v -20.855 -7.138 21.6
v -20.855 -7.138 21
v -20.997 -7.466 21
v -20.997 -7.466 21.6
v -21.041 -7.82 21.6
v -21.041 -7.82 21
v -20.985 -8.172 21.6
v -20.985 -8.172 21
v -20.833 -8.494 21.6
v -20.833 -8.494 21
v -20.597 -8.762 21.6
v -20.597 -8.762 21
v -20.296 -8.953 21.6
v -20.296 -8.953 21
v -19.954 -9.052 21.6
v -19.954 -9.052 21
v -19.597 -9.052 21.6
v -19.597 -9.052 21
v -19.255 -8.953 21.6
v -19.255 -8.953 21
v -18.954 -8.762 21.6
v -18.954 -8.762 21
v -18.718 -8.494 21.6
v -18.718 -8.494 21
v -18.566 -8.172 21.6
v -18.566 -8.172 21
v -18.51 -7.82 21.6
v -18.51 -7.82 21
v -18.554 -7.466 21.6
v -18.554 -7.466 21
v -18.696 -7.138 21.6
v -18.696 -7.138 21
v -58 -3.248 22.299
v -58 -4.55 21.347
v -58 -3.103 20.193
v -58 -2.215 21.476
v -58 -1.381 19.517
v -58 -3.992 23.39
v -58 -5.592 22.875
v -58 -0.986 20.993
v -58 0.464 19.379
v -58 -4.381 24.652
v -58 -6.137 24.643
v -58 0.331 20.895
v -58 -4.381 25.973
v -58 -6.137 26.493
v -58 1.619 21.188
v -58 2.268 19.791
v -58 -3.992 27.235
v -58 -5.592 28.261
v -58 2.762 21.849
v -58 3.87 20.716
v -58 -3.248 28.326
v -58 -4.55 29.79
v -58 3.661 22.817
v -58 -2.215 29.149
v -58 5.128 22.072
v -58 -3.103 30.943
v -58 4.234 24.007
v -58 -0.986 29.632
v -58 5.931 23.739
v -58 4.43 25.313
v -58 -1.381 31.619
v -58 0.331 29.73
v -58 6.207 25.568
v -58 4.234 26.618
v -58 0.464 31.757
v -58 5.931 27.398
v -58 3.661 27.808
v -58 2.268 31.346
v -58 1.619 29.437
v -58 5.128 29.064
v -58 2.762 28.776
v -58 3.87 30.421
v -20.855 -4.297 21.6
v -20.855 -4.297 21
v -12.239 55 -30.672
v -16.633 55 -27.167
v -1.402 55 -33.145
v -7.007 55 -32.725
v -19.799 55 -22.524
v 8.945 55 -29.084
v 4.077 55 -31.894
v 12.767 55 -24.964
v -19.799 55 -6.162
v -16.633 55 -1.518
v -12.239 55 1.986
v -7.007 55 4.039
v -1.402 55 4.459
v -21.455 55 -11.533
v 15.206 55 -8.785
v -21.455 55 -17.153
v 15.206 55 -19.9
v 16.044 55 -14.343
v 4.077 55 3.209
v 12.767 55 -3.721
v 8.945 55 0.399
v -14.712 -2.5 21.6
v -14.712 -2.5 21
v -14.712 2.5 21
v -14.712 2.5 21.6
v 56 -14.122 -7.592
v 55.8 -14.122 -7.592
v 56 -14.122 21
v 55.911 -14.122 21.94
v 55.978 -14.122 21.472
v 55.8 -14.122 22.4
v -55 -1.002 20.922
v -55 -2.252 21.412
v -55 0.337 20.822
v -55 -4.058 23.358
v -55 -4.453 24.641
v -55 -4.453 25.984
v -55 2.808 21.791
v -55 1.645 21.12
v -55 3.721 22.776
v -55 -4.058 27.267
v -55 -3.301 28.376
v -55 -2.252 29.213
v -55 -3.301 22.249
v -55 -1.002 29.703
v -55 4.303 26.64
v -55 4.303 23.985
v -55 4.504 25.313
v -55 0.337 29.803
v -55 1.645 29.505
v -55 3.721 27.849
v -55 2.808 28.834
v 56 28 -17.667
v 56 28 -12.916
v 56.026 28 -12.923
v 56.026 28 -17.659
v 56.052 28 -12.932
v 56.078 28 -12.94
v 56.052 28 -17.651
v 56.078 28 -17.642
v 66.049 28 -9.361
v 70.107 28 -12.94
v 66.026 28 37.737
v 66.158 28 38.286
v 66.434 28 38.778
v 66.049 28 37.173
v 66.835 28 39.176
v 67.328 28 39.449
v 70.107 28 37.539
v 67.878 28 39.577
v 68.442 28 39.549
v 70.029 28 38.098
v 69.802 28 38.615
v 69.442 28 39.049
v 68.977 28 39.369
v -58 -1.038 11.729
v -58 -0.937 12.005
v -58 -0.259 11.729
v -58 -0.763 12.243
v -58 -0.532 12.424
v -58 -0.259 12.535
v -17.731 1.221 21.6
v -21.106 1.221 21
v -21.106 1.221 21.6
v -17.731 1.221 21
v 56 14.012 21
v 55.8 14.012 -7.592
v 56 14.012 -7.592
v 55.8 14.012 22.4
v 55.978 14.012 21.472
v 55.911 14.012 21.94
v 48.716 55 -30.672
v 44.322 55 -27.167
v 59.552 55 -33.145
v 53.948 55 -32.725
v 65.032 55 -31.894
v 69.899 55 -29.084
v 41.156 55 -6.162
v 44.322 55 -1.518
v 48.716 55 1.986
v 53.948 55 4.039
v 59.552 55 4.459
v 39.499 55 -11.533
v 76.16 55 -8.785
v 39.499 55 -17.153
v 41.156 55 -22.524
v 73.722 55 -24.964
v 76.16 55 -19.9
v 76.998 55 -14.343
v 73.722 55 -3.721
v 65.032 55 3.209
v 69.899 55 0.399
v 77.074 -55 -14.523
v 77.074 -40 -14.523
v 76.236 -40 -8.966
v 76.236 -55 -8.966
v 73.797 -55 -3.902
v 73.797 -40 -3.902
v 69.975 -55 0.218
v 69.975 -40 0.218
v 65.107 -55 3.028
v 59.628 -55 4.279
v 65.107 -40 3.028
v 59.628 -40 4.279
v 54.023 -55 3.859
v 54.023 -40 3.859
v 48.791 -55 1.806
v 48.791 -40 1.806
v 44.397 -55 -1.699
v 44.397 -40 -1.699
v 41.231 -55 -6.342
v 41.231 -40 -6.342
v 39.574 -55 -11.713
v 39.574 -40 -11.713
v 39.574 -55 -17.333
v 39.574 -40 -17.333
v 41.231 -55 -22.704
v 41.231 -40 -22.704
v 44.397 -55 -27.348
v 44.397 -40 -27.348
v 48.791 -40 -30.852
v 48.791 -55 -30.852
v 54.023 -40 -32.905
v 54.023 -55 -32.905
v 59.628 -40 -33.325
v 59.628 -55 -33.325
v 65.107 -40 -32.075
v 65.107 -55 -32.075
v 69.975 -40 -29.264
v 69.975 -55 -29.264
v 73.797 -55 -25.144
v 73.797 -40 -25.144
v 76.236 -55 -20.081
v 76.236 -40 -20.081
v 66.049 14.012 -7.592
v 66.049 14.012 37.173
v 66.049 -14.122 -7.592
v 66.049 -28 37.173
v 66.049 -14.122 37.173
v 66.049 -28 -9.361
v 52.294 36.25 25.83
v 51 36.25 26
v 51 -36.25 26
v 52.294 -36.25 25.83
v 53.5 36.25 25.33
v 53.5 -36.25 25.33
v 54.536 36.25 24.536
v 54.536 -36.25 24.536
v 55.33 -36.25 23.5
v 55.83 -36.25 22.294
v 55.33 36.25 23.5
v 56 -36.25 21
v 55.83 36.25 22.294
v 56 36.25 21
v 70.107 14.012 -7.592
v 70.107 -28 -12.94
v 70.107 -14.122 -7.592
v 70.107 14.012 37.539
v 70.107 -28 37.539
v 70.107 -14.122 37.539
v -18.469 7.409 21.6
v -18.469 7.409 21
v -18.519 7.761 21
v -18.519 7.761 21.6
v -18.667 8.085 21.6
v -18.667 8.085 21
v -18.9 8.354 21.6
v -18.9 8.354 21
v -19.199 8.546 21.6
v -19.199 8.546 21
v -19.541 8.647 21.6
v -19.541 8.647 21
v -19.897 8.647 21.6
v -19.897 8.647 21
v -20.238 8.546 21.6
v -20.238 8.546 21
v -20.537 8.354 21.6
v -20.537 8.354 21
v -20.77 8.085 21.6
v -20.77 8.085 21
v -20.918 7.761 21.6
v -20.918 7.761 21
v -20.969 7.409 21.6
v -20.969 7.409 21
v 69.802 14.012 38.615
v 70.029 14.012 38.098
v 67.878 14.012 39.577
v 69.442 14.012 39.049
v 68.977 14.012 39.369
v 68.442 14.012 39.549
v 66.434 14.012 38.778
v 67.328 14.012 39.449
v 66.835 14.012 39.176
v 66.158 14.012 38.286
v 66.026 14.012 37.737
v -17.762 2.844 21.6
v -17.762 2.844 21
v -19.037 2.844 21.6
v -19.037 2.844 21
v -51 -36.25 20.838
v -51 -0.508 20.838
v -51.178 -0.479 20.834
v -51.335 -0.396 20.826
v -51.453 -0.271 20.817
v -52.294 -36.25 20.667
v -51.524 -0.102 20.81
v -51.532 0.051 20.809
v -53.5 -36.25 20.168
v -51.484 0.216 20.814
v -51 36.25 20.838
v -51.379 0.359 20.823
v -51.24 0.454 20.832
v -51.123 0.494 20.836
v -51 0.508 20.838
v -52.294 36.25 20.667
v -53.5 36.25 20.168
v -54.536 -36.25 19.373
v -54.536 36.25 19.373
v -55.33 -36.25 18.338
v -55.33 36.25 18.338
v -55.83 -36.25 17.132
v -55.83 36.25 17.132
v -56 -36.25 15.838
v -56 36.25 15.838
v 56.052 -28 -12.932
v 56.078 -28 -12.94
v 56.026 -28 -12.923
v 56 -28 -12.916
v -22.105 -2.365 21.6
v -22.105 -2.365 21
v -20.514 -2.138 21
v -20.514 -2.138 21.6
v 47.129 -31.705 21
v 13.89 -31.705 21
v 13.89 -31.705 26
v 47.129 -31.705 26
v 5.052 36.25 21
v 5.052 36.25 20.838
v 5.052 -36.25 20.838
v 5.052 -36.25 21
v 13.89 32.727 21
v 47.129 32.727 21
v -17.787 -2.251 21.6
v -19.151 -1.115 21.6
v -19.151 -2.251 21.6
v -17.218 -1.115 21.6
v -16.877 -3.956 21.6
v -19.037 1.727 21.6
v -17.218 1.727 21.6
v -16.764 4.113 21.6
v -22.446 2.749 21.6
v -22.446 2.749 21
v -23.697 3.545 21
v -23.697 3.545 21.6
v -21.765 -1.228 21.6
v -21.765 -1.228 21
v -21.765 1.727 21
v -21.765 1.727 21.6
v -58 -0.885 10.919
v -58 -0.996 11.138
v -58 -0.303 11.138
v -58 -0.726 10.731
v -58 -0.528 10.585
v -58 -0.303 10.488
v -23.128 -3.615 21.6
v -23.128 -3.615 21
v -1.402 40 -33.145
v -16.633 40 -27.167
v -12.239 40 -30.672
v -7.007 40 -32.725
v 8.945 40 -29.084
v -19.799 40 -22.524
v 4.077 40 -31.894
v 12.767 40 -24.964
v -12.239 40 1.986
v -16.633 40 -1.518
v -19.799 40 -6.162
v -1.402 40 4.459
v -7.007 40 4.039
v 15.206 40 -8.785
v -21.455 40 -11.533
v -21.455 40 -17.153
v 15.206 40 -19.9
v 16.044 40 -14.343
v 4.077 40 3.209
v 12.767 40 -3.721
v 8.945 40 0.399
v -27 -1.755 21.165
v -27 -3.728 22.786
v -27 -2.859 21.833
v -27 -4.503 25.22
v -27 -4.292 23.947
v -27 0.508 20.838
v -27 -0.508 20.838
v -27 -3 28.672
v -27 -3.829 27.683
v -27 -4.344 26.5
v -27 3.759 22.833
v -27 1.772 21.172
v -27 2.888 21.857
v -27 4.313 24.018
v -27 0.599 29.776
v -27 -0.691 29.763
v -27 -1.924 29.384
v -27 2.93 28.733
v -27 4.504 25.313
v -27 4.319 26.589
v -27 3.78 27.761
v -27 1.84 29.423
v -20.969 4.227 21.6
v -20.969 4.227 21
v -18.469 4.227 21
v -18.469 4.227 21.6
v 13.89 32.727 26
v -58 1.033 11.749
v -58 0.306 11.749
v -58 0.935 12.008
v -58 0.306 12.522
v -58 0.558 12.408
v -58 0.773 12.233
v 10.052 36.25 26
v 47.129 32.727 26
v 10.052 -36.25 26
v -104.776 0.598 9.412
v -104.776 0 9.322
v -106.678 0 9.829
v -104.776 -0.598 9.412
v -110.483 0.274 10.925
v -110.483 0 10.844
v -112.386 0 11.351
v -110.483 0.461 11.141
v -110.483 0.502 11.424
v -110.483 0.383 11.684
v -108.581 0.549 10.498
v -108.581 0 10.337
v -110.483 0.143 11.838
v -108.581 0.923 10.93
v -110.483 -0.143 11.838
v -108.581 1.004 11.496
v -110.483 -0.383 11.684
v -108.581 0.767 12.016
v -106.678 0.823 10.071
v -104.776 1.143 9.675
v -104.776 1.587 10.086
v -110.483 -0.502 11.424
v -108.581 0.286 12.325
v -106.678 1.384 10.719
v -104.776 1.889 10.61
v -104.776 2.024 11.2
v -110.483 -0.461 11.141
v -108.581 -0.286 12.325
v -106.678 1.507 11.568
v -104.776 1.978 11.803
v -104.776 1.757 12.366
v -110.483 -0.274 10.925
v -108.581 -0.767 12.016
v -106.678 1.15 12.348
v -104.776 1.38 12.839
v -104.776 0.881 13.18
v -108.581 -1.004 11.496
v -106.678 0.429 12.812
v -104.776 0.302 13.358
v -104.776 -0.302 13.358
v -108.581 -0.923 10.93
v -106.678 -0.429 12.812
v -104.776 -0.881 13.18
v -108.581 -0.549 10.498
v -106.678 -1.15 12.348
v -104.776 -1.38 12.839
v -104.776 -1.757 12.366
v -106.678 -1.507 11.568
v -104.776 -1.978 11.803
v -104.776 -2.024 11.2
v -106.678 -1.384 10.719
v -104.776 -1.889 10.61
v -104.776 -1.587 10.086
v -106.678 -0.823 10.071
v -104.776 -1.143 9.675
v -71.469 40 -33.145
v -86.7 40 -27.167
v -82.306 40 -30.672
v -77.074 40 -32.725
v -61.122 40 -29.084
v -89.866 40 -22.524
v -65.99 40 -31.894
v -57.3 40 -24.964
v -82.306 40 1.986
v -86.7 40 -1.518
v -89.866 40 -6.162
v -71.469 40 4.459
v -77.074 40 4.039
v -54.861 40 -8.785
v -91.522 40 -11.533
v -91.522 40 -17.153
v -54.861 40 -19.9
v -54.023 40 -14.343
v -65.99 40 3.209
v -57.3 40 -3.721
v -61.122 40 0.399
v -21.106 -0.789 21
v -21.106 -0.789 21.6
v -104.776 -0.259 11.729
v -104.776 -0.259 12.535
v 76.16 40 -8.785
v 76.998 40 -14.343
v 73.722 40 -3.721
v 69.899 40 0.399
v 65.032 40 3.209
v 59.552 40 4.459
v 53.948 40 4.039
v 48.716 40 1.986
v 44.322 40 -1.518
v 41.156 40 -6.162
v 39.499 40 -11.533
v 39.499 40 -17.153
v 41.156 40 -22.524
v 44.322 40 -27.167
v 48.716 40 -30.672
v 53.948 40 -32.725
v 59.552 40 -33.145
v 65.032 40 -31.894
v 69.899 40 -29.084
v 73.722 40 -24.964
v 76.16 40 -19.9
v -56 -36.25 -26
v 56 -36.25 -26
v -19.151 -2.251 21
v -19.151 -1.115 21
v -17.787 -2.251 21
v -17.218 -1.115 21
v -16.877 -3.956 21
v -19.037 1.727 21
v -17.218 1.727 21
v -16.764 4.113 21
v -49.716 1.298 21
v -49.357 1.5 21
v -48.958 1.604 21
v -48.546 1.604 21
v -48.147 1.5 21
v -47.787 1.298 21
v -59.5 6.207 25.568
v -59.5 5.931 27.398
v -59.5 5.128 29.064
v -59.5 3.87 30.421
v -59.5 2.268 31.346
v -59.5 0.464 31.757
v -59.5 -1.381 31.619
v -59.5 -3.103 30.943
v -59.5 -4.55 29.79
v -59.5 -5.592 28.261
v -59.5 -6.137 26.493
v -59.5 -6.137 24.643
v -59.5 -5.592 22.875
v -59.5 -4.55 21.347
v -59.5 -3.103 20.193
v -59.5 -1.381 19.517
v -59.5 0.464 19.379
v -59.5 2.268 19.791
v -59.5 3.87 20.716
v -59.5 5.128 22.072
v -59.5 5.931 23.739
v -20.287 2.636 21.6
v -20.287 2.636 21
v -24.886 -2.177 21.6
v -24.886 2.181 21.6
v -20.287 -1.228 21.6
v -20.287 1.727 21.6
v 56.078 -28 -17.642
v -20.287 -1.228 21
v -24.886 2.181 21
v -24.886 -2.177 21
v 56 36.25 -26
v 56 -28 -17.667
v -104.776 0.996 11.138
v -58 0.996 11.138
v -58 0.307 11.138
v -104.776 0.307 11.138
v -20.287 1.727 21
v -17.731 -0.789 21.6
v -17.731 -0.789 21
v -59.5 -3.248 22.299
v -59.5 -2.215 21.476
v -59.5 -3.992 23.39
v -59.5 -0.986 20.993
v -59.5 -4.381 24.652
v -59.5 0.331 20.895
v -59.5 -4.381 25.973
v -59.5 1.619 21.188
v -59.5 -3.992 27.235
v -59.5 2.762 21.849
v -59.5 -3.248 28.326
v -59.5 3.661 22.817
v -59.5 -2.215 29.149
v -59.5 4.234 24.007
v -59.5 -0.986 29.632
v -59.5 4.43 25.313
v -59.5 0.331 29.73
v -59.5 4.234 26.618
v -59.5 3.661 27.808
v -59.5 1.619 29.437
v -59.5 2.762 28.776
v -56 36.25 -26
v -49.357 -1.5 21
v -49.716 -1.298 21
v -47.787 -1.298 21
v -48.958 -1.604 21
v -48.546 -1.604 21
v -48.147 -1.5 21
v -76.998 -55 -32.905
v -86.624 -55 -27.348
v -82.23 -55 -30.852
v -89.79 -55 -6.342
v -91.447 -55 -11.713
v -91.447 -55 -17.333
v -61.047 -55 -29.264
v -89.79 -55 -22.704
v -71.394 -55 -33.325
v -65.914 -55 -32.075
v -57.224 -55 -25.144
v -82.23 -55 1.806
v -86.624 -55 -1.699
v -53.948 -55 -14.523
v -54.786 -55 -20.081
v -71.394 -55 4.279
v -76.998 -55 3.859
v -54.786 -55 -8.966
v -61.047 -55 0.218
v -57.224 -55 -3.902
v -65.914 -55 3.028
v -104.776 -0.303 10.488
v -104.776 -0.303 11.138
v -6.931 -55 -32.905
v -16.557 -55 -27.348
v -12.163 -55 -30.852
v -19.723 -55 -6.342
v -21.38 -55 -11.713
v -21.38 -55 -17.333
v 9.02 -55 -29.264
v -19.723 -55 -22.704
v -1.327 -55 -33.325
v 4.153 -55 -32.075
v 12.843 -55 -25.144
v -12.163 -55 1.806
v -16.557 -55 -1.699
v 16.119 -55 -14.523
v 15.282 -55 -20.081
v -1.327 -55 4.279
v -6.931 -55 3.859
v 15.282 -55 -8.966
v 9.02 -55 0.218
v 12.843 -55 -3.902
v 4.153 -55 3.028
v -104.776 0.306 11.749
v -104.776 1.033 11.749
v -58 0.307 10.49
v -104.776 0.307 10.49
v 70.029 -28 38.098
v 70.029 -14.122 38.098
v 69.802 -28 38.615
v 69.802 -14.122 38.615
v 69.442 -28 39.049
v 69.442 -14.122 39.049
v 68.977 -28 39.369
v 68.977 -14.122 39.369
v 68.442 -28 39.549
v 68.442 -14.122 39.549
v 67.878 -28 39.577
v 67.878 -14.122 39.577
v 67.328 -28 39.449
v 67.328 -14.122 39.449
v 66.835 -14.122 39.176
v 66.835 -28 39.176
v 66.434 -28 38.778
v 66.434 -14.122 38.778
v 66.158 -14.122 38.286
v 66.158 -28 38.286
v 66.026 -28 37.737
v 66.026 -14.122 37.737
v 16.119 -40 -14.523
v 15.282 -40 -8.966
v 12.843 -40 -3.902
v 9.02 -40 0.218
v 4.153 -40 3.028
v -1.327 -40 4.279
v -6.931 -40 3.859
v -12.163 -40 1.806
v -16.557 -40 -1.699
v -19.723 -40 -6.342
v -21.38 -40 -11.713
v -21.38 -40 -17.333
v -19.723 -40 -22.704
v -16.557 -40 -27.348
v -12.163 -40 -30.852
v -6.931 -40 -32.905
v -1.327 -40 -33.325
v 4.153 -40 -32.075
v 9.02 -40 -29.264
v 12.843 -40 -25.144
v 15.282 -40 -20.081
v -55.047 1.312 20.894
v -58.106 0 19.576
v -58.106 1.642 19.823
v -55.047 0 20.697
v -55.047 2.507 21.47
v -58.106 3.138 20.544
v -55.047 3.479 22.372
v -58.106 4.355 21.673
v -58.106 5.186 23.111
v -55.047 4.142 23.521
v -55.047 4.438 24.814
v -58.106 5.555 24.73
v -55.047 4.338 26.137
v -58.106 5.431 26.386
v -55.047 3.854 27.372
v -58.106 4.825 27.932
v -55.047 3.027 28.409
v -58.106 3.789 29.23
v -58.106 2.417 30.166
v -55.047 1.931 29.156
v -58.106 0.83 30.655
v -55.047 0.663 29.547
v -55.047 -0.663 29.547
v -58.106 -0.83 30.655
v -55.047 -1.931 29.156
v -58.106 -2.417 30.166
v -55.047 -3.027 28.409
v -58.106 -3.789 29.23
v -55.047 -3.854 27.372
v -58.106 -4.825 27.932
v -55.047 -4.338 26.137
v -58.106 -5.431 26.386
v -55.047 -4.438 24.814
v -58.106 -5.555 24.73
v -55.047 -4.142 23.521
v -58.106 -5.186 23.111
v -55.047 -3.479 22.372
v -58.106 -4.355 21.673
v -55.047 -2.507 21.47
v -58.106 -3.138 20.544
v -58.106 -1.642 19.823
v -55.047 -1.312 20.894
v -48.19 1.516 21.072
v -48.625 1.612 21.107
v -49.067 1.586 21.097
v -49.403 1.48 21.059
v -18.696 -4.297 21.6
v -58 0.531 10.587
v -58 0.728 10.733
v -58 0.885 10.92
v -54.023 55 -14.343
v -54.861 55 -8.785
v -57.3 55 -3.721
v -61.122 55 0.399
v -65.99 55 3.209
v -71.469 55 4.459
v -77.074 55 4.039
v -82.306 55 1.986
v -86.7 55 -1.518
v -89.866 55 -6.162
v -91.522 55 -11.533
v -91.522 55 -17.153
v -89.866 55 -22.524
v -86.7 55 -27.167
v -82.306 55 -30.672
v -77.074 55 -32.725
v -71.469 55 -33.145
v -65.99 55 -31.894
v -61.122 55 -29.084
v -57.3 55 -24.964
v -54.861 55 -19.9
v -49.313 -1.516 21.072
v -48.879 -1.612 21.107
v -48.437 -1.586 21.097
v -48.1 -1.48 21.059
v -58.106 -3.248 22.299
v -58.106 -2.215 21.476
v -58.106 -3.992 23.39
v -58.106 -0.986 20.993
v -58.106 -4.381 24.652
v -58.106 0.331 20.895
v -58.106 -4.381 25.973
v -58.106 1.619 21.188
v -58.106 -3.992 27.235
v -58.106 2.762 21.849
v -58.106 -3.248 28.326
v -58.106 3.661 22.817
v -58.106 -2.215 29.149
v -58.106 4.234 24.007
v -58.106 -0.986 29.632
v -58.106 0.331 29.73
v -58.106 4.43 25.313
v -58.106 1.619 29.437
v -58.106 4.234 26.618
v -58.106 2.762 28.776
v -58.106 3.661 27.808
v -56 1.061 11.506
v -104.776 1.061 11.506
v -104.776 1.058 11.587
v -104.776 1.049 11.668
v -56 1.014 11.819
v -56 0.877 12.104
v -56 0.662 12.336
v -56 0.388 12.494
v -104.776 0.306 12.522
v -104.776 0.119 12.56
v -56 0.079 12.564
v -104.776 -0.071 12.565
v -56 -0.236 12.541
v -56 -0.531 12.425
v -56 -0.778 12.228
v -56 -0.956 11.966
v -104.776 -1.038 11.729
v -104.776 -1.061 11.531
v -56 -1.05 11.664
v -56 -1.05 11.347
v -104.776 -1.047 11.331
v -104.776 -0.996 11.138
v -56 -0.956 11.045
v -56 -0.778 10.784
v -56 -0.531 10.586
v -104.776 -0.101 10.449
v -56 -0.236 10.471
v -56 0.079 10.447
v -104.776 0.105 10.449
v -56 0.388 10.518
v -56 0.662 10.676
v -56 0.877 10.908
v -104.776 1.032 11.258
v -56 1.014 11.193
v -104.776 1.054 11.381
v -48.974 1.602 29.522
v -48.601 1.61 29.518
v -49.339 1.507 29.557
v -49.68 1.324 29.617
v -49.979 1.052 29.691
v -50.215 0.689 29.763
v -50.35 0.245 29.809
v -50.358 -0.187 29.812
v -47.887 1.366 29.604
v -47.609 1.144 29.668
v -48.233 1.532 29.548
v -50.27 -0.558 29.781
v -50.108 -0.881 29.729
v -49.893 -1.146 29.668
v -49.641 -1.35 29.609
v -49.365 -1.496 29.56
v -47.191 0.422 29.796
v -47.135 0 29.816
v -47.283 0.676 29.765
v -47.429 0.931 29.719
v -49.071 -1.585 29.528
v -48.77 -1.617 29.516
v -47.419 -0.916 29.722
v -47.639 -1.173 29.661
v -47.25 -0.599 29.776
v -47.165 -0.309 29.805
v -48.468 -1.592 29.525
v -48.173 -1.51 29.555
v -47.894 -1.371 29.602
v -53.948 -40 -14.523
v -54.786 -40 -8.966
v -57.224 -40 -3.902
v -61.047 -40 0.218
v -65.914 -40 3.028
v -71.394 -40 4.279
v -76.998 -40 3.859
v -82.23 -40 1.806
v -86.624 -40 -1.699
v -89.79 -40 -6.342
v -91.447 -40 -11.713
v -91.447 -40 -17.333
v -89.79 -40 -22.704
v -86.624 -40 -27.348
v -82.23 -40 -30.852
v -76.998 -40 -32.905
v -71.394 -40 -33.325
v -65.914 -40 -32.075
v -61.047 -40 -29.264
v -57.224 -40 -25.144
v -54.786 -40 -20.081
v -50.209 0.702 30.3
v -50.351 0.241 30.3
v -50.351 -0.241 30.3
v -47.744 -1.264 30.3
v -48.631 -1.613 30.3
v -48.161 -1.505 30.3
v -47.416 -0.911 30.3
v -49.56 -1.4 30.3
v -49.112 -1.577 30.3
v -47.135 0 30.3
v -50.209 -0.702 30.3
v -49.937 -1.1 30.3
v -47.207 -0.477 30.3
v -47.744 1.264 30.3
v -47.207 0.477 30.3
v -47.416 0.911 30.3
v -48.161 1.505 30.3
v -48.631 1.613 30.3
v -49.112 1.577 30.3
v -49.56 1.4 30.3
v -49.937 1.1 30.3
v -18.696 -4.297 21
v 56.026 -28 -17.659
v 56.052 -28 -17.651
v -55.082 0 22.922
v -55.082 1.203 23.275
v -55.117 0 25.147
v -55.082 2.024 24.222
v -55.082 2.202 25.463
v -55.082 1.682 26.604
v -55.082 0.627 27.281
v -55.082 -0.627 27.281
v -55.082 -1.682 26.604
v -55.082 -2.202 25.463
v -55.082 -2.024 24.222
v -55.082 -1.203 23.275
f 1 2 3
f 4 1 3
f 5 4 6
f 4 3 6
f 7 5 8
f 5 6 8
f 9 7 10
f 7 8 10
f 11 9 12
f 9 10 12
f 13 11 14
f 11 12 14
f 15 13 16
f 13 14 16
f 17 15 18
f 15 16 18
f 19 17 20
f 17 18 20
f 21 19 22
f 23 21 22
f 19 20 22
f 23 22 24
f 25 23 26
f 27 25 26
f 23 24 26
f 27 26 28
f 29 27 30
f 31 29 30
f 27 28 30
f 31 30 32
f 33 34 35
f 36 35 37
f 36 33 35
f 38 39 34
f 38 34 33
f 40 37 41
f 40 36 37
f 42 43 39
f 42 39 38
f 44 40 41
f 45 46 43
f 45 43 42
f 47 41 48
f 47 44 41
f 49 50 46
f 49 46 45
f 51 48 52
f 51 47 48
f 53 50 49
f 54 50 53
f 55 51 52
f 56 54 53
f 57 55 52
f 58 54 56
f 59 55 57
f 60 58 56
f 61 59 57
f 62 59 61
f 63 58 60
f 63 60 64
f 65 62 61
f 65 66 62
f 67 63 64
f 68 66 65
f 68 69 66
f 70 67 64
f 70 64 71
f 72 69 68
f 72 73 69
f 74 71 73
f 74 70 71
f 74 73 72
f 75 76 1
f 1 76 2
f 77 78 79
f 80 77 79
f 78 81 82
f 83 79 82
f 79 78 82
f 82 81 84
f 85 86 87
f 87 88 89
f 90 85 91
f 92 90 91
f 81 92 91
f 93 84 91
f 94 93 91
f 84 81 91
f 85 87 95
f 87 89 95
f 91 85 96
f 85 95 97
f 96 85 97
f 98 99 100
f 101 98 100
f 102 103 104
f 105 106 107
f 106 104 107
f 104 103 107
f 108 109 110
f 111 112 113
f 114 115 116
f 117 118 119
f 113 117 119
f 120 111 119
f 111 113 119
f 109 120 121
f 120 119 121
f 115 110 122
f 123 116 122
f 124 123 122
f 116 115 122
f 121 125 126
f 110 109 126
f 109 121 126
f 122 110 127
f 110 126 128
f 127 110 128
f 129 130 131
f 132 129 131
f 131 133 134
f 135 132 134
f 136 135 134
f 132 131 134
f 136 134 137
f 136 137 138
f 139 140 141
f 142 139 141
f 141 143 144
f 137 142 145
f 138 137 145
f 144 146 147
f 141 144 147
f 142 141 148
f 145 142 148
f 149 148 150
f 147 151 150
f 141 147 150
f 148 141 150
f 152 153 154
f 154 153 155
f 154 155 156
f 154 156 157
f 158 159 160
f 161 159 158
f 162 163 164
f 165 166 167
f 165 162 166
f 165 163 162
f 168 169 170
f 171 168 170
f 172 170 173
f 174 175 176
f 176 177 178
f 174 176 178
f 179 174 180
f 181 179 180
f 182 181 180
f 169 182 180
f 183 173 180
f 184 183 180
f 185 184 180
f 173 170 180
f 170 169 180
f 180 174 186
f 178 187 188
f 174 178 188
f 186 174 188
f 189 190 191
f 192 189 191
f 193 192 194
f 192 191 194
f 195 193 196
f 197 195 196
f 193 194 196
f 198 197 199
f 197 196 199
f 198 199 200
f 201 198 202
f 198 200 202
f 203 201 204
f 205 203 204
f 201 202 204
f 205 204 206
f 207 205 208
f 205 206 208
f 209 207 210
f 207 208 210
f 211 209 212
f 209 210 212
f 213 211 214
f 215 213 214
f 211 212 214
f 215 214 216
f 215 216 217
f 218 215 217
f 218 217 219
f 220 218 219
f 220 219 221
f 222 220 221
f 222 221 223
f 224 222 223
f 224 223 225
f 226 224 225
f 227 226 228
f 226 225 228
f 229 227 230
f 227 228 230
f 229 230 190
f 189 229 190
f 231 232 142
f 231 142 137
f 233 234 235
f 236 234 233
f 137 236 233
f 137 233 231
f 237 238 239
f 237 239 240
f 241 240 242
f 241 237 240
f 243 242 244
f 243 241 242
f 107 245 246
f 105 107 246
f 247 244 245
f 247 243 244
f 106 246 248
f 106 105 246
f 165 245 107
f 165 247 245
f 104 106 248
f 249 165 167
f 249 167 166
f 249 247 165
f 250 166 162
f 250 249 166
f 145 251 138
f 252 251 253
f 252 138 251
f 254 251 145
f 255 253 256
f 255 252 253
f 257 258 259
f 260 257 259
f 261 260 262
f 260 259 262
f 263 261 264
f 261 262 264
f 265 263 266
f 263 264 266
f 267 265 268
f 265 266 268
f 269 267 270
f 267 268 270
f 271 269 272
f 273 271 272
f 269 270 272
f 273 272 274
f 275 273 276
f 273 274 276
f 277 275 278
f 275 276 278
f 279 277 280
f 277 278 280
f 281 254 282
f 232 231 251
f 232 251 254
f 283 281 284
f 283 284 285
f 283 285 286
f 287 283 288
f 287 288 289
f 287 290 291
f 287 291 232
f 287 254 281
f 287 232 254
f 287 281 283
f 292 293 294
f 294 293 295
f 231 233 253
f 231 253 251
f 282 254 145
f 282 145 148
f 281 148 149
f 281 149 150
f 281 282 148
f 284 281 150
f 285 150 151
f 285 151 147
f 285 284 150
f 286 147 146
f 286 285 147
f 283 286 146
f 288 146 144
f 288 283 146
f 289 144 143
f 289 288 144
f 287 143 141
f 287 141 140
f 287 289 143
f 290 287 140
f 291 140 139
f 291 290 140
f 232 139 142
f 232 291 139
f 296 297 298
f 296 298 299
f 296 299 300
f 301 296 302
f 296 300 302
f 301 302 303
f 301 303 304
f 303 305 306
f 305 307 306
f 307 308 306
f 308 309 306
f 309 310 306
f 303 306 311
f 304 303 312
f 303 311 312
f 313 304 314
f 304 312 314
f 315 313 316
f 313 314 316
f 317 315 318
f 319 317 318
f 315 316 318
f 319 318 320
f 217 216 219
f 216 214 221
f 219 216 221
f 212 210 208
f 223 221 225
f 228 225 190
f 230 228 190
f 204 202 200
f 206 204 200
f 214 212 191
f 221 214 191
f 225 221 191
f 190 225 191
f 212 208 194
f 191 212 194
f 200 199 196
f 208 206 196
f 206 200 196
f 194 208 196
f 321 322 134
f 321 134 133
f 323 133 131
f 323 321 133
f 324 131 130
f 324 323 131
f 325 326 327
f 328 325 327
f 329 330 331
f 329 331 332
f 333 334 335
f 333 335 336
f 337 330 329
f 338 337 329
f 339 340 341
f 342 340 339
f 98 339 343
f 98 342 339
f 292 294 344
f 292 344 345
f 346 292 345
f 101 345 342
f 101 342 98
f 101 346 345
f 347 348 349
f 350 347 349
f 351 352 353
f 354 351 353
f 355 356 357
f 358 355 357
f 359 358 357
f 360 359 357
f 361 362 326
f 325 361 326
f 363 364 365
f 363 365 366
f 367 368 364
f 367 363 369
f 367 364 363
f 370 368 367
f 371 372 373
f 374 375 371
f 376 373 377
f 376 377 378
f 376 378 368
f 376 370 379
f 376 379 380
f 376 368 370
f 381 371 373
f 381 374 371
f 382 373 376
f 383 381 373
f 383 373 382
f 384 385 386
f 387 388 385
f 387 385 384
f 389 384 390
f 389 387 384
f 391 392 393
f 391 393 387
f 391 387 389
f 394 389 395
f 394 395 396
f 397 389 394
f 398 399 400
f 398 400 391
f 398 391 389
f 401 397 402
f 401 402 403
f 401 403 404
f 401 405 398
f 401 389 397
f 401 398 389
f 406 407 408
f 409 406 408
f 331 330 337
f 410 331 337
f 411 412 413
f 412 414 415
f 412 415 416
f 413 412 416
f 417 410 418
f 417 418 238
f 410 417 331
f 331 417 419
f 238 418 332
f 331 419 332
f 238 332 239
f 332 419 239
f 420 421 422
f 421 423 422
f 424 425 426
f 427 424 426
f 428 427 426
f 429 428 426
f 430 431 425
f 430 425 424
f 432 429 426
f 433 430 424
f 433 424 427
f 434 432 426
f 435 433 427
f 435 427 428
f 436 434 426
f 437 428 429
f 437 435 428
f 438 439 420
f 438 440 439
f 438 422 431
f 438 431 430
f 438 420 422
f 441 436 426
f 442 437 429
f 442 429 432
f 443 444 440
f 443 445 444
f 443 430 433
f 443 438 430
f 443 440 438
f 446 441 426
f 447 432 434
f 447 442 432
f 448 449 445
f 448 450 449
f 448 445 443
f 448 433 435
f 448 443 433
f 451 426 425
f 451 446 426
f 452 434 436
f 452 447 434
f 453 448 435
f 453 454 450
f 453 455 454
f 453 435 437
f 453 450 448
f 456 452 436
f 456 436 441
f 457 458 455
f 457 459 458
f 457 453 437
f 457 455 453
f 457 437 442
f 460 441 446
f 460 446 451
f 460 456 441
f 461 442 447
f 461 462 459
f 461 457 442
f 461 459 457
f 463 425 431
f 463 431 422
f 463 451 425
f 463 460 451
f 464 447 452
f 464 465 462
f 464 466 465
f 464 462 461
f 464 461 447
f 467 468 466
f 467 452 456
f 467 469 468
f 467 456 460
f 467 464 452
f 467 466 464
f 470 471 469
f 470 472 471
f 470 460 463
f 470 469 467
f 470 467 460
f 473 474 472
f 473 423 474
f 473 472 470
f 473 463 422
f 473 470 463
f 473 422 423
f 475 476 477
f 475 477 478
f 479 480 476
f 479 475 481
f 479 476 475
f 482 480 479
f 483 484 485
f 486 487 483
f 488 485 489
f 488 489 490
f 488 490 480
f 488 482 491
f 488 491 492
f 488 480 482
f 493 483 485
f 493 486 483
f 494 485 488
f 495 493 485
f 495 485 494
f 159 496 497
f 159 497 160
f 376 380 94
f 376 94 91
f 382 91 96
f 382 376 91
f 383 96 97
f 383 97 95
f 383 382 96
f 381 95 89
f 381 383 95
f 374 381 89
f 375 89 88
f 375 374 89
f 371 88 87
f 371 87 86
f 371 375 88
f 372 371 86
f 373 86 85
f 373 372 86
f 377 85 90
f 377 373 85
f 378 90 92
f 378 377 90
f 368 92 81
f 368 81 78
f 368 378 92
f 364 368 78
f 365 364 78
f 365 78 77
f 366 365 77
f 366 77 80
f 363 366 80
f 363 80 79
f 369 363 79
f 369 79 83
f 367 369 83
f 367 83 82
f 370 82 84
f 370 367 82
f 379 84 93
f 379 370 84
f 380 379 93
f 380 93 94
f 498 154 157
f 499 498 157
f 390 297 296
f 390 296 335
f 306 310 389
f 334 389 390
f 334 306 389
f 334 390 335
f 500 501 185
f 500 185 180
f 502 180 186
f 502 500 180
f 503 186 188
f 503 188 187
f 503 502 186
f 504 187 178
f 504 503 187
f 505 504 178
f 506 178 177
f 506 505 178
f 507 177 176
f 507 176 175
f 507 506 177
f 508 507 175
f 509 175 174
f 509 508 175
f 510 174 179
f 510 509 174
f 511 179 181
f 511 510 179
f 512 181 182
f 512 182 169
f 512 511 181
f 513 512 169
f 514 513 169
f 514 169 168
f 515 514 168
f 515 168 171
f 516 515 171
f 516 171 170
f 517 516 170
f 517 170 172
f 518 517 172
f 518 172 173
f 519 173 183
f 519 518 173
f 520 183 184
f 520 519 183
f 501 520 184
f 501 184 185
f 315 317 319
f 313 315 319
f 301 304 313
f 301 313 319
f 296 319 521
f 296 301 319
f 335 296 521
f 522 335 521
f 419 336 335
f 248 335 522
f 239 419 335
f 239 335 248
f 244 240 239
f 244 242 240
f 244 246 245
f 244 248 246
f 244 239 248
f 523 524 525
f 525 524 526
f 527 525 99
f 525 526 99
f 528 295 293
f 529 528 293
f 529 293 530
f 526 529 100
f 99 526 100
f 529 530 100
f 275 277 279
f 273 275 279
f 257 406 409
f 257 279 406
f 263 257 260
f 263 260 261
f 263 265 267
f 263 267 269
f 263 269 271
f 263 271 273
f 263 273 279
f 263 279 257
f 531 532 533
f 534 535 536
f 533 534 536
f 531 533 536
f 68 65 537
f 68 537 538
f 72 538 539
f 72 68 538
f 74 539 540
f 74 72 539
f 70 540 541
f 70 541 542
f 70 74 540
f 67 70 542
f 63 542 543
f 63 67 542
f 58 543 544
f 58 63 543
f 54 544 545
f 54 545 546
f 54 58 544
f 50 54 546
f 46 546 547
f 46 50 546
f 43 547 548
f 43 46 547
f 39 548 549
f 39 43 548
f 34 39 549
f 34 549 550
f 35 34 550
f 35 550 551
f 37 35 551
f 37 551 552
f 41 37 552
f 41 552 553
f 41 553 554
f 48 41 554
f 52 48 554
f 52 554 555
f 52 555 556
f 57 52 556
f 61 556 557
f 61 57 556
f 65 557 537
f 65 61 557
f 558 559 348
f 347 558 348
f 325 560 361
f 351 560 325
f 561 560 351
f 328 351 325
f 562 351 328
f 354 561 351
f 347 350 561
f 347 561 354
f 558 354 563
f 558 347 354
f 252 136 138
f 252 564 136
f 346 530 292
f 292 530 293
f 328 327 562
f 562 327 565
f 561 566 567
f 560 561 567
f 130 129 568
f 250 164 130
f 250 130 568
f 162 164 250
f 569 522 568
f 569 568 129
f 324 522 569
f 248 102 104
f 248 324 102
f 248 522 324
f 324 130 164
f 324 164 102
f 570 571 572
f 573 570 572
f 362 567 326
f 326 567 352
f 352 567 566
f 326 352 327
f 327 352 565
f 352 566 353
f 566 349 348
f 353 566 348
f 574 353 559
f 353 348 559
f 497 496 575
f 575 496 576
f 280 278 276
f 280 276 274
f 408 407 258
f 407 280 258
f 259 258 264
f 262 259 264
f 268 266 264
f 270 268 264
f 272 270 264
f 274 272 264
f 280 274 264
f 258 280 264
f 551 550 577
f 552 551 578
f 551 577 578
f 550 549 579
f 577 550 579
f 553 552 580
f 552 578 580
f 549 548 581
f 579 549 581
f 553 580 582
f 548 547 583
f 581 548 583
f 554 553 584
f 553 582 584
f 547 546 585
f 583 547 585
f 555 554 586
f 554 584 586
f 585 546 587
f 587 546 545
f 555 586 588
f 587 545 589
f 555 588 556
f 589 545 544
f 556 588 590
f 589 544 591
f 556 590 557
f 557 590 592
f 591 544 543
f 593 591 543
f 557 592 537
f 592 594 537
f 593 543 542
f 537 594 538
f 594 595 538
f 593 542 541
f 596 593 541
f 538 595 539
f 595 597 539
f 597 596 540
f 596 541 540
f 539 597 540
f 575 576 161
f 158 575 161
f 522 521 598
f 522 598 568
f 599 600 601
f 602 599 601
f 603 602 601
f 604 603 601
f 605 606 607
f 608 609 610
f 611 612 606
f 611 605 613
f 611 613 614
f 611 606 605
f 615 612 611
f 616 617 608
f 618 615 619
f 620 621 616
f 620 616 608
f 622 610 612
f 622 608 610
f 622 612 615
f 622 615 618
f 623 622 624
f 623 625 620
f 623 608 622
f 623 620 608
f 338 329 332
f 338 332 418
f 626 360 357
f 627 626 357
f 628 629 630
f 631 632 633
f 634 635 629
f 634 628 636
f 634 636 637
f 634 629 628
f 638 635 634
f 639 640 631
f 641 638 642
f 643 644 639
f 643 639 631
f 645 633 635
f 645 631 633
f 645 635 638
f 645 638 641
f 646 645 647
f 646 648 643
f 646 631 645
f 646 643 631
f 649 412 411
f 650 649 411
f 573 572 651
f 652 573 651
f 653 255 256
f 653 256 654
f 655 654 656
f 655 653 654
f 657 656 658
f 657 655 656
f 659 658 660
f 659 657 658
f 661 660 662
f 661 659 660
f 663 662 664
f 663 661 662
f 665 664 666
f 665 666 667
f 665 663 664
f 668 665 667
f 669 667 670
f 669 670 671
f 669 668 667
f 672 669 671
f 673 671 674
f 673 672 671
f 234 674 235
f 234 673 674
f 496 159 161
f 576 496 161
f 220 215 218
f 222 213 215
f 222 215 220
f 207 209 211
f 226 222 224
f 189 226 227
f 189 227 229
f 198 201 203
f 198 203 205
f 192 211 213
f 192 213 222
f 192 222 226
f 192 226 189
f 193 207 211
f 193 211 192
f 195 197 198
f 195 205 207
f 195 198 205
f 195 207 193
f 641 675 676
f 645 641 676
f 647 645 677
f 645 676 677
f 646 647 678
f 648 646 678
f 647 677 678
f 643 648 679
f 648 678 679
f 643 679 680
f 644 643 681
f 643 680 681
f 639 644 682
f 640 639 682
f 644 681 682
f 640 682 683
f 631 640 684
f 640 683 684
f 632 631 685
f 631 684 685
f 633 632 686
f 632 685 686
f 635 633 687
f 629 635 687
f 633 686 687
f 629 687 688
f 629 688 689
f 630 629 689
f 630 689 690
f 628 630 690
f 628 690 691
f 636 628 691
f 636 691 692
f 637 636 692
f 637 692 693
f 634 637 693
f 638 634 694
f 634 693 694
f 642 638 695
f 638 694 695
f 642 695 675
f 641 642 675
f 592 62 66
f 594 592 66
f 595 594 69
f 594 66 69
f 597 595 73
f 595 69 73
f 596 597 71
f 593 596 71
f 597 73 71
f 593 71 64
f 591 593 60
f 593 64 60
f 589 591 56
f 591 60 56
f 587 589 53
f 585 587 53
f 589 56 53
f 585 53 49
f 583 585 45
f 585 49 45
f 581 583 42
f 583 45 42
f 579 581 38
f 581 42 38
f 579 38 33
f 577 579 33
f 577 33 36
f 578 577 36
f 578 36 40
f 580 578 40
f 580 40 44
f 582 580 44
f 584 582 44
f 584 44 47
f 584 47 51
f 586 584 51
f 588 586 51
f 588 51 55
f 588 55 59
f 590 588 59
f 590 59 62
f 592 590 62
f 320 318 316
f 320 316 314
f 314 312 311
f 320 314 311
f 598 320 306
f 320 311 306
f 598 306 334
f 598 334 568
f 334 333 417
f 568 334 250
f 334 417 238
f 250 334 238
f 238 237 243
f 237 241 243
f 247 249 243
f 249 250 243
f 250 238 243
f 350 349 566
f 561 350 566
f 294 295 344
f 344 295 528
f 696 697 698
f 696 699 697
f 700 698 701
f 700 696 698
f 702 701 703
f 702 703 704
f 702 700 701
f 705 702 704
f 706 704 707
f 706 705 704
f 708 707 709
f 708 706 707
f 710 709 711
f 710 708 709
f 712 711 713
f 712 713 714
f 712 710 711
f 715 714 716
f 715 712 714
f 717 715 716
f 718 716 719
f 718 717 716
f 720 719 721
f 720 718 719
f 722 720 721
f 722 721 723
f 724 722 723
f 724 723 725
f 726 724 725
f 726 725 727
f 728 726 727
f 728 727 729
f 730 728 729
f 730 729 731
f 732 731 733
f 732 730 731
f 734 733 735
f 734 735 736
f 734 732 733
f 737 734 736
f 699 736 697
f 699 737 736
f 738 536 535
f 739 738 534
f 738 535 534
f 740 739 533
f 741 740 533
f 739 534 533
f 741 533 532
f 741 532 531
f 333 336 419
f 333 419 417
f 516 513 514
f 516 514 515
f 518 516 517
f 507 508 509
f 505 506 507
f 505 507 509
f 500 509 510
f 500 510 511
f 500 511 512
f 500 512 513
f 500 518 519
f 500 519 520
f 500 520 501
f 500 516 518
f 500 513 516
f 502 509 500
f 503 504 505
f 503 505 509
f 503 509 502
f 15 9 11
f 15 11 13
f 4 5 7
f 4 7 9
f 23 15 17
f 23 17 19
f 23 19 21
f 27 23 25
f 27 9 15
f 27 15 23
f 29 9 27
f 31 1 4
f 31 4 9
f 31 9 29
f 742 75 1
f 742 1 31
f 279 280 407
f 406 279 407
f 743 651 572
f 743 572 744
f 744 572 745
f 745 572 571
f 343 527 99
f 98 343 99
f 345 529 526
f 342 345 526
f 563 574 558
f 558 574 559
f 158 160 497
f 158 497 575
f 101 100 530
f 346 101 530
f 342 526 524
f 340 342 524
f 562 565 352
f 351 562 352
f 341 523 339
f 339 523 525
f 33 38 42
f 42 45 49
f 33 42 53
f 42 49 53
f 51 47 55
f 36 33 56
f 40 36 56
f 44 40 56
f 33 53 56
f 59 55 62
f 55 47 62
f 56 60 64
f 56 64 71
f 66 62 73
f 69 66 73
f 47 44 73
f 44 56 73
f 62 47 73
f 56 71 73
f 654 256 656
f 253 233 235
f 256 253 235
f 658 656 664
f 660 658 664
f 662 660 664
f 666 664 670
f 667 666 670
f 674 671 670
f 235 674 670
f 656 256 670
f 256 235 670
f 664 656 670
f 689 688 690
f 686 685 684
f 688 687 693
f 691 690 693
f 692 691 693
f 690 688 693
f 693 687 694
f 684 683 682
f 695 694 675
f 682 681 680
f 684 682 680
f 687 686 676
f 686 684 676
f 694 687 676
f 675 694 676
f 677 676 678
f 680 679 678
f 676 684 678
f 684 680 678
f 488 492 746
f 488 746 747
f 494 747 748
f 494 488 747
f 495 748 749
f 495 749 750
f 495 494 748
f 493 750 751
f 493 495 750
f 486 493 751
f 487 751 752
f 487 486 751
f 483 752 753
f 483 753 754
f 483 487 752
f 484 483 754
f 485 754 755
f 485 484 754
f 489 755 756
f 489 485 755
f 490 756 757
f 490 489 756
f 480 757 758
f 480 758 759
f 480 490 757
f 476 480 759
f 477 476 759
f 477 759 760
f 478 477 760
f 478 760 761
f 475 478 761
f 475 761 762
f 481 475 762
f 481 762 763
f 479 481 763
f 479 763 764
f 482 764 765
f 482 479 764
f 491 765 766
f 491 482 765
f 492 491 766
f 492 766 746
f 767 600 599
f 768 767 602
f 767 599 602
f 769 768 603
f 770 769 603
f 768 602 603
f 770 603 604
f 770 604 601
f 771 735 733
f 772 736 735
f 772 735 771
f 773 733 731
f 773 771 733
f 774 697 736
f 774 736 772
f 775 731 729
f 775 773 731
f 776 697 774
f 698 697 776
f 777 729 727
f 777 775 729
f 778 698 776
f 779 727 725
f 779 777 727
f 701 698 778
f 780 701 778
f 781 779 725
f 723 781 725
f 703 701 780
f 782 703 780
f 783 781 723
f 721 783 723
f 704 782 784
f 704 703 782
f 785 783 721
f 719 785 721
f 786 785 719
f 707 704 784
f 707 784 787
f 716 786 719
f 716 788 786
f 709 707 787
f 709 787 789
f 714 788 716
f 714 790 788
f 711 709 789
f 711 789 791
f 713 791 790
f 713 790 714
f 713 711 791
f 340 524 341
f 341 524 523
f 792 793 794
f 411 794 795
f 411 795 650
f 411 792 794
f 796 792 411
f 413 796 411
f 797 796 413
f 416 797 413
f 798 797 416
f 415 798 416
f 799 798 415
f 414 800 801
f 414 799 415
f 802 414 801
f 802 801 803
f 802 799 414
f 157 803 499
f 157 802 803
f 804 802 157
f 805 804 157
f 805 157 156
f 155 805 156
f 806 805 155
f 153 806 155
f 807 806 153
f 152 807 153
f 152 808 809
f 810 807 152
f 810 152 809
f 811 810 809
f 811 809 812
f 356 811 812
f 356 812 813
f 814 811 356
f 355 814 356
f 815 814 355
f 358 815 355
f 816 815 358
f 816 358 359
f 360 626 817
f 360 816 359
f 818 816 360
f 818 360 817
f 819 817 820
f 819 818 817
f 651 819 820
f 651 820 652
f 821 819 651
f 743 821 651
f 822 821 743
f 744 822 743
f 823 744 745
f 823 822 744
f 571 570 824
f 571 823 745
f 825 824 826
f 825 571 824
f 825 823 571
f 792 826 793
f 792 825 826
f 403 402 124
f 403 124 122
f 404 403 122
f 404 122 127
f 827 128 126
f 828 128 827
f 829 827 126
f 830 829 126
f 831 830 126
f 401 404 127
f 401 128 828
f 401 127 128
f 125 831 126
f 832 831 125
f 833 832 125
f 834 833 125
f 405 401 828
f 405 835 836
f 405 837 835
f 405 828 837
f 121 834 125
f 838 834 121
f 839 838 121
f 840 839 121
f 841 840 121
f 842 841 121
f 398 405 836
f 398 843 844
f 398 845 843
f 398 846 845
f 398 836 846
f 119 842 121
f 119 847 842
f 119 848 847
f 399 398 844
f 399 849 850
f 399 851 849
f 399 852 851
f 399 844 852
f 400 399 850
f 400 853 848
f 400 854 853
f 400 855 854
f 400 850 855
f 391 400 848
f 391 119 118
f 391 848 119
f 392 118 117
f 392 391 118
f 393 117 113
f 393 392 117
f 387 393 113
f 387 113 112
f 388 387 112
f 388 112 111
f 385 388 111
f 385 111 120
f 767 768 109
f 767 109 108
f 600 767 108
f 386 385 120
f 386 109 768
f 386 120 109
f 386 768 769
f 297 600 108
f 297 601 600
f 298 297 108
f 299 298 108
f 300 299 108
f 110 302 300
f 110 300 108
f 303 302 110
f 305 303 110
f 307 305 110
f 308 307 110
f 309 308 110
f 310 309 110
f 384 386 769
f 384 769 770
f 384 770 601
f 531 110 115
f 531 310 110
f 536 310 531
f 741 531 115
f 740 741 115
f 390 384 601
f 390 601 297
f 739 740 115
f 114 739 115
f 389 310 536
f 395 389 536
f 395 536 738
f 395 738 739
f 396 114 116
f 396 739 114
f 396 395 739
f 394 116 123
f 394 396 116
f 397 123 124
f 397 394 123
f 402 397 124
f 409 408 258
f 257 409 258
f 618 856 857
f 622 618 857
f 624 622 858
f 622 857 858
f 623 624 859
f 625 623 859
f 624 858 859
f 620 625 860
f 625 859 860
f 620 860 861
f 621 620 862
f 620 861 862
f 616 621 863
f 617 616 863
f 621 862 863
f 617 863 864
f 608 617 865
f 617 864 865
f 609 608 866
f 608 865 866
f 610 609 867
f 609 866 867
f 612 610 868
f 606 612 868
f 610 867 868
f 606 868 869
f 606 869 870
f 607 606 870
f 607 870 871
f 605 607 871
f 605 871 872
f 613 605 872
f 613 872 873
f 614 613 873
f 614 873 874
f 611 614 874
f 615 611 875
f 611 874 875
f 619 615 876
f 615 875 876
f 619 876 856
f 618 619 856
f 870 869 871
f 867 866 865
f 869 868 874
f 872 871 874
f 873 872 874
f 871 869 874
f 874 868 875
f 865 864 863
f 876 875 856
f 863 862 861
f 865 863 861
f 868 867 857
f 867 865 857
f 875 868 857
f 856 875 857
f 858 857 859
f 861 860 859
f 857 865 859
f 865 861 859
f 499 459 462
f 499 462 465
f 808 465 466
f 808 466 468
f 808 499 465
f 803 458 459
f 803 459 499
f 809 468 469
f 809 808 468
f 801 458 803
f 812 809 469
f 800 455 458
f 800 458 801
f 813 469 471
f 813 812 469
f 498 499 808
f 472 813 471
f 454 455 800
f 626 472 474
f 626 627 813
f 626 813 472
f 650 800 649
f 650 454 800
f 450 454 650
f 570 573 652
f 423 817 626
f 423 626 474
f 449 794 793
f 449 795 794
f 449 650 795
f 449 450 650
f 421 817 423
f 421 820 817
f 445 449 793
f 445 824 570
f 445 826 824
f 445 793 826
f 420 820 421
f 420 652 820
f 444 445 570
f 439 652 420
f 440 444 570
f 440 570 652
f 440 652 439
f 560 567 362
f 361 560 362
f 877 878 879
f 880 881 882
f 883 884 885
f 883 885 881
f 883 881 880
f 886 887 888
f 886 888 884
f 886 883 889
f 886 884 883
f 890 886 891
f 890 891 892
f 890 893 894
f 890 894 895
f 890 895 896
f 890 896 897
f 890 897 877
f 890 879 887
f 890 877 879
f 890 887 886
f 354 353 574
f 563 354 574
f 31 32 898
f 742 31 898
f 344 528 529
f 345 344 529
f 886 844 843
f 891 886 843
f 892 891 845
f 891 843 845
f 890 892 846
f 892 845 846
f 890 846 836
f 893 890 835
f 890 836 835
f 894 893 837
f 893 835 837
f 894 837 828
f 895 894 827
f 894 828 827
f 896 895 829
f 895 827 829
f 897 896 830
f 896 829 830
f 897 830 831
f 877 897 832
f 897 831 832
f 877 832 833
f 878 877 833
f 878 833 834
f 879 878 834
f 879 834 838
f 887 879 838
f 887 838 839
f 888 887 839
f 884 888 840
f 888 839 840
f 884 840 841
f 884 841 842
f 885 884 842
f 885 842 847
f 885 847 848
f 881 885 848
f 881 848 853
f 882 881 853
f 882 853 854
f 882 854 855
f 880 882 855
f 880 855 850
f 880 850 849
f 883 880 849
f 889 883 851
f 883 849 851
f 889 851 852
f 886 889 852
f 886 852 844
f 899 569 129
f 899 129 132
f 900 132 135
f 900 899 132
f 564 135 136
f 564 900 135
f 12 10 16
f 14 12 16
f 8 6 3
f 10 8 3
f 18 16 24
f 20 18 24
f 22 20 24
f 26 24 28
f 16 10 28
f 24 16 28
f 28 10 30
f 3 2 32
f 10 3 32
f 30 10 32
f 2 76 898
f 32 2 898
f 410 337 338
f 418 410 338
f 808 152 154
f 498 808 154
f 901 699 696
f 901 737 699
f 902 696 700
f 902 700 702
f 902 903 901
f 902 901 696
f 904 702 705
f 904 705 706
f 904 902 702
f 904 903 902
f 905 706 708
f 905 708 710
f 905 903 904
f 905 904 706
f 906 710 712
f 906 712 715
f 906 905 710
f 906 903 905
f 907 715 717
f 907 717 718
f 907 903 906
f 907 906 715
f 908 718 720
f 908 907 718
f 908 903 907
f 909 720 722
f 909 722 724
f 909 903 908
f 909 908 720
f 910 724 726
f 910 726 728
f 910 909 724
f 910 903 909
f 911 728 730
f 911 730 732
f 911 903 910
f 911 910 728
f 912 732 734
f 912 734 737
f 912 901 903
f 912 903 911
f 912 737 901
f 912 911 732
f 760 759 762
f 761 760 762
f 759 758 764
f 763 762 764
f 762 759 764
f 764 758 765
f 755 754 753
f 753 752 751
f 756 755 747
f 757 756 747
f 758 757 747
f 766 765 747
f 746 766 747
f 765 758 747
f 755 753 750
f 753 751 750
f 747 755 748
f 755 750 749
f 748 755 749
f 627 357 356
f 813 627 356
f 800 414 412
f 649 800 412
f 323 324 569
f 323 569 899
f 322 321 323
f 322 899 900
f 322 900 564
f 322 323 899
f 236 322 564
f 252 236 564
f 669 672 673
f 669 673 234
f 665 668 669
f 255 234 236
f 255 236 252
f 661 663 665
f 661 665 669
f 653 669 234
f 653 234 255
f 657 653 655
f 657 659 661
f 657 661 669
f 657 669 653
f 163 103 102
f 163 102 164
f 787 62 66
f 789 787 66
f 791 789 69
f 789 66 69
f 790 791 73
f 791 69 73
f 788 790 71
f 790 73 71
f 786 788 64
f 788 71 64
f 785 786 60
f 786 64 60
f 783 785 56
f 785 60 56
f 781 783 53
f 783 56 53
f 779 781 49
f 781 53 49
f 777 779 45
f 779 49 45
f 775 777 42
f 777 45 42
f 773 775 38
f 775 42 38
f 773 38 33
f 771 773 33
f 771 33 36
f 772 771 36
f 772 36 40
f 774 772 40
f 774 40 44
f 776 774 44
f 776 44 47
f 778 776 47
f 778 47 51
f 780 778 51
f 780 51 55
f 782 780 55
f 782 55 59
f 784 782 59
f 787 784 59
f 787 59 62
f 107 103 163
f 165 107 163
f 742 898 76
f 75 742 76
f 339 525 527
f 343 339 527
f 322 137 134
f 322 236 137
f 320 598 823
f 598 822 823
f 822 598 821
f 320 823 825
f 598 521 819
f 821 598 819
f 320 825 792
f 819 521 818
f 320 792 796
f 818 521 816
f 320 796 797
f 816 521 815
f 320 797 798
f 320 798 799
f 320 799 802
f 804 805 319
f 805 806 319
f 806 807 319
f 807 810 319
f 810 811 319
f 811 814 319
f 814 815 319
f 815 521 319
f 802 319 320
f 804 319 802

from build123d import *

# Parameters (mm, degrees)
F0_W           = 112
F0_H           = 52
F1_DEPTH       = 36.25
F1_DEPTH_BACK  = 36.25
F2_W           = 62.7835113555
F2_H           = 8.2989688963
F3_DEPTH       = 40
F3_DEPTH_BACK  = 40
F4_SIZE        = 5
F5_R           = 5
F8_DEPTH       = 0.6
F9_W           = 3.3755060285
F9_H           = 2.0101326518
F10_DEPTH      = 0.6
F12_R          = 18.8548205179
F13_DEPTH      = 15
F19_R          = 18.8548205179
F20_DEPTH      = 15
F24_DEPTH      = 28
F24_DEPTH_BACK = 28
F26_W          = 28.1342324962
F26_H          = 48.9349166028
F27_DEPTH      = 25
F29_R          = 4.5035590708
F30_DEPTH      = 28
F32_R          = 6.2065419795
F33_DEPTH      = 1.5
F36_R          = 4.4303853292
F37_DEPTH      = 25
F38_R          = 1.617072427
F39_DEPTH      = 9.3
F40_W          = 33.2386381924
F40_H          = 64.4318200648
F41_DEPTH      = 25
F42_R          = 1.0614733058
F43_DEPTH      = 80
F45_DEPTH      = 90


# Not quite as in the source:
# - the program builds the solid bodies; features that only make, move or delete a surface that nothing else refers to are left out


with BuildPart() as f1:
    # F0 (on Front) → F1 (new body, two sides)
    with BuildSketch(Plane.XZ) as f1_sk:
        Rectangle(F0_W, F0_H)
    extrude(amount=F1_DEPTH)
    extrude(f1_sk.sketch, amount=-F1_DEPTH_BACK)

    # F2 (on Front) → F3 (cut, two sides)
    with BuildSketch(Plane.XZ) as f3_sk:
        with Locations((-26.3402080163, 24.9871136621)):
            Rectangle(F2_W, F2_H)
    extrude(amount=-F3_DEPTH, mode=Mode.SUBTRACT)
    extrude(f3_sk.sketch, amount=F3_DEPTH_BACK, mode=Mode.SUBTRACT)

    # F4
    f4_edges = [f1.edges().sort_by_distance(p)[0] for p in [
        (5.051548, 0, 26),
    ]]
    chamfer(f4_edges, length=F4_SIZE)

    # F5
    f5_edges = [f1.edges().sort_by_distance(p)[0] for p in [
        (56, 0, 26),
        (-56, 0, 20.837629),
    ]]
    fillet(f5_edges, radius=F5_R)

    # F23 (on Front) → F24 (join, two sides)
    with BuildSketch(Plane.XZ) as f24_sk:
        with BuildLine():
            Line((66.0493522882, -9.3606118894), (56.0777671635, -12.9401576556))
            ThreePointArc((56.0777671635, -12.9401576556), (52.810402565, -15.2911024559), (56.0777671635, -17.6420472562))
            Line((56.0777671635, -17.6420472562), (70.1072718896, -12.9401576556))
            Line((70.1072718896, -12.9401576556), (70.1072718896, 37.5393816017))
            ThreePointArc((70.1072718896, 37.5393816017), (67.878123137, 39.5765729642), (66.0493522882, 37.1734812074))
            Line((66.0493522882, 37.1734812074), (66.0493522882, -9.3606118894))
        make_face()
    extrude(amount=F24_DEPTH)
    extrude(f24_sk.sketch, amount=-F24_DEPTH_BACK)

    # F26 (on offset) → F27 (cut)
    with BuildSketch(Plane.YZ.offset(55.8)):
        with Locations((-0.0549908727, 16.8750025332)):
            Rectangle(F26_W, F26_H)
    extrude(amount=F27_DEPTH, mode=Mode.SUBTRACT)

    # F29 (on offset) → F30 (join)
    with BuildSketch(Plane.YZ.offset(-27)):
        with Locations((0, 25.3125000745)):
            Circle(F29_R)
    extrude(amount=-F30_DEPTH)

    # F38 (on offset) → F39 (join)
    with BuildSketch(Plane.XY.offset(21)):
        with Locations((-48.7517826259, 0)):
            Circle(F38_R)
    extrude(amount=F39_DEPTH)

    # F40 (on offset) → F41 (cut)
    with BuildSketch(Plane.XY.offset(21)):
        with Locations((30.5095855147, 0.5113650113)):
            Rectangle(F40_W, F40_H)
    extrude(amount=F41_DEPTH, mode=Mode.SUBTRACT)

    # F42 (on offset) → F43 (join)
    with BuildSketch(Plane.YZ.offset(-27)):
        with Locations((0, 11.5056820214)):
            Circle(F42_R)
    extrude(amount=-F43_DEPTH)

    # F44 (on offset) → F45 (cut)
    with BuildSketch(Plane.YZ.offset(-58)):
        Polygon((-0.9458741988, 10.3932730854), (-0.3025215992, 10.4609942064), (-0.3025215992, 11.1382082105), (-1.1828994611, 11.1382082105), align=None)
        Polygon((1.2212089496, 11.1382082105), (0.3069706145, 11.1382082105), (0.3069706145, 10.4609942064), (0.8487420273, 10.3594120592), align=None)
        Polygon((-1.3505744282, 11.729169637), (-0.2593955433, 11.729169637), (-0.2593955433, 12.6839512959), (-1.2141767656, 12.4306418002), (-1.2921184534, 12.0214503258), (-1.3505744282, 11.865567416), align=None)
        Polygon((1.1240632739, 12.7813778818), (0.3056792775, 12.7813778818), (0.3056792775, 11.7486547679), (1.2604609365, 11.7486547679), align=None)
    extrude(amount=-F45_DEPTH, mode=Mode.SUBTRACT)

    # F46 (on Front) → F47 (revolve)
    with BuildSketch(Plane.XZ):
        Polygon((-104.7758087516, 9.3221208081), (-104.7758087516, 11.3514680415), (-112.3858690262, 11.3514680415), align=None)
    revolve(axis=Axis((-108.5808388889, 0, 11.3514680415), (1, 0, 0)))


with BuildPart() as f8:
    # F7 (on offset) → F8 (new body)
    with BuildSketch(Plane.XY.offset(21)):
        Polygon((-14.7115389197, -2.5), (-14.7115389197, 0), (-14.7115389197, 2.5), (-16.7638007551, 4.1132308543), (-17.7618643205, 2.8435503501), (-19.036853686, 2.8435503501), (-19.036853686, 1.7265254864), (-17.2184109688, 1.7265254864), (-17.2184109688, -1.1147919577), (-19.150506705, -1.1147919577), (-19.150506705, -2.2513177246), (-17.7866742015, -2.2513177246), (-16.8774537742, -3.9561078884), align=None)
    extrude(amount=F8_DEPTH)


with BuildPart() as f8b:
    # F7 (on offset) → F8, piece 2 (new body)
    with BuildSketch(Plane.XY.offset(21)):
        Polygon((-21.7645186931, 1.7265254864), (-20.2870331705, 1.7265254864), (-20.2870331705, 2.63574766), (-22.4464330822, 2.7494002134), (-23.6966125667, 3.5449680872), (-24.8860276497, 2.1811358165), (-24.8860276497, -2.1770501812), (-23.1283511966, -3.6151502281), (-22.1054758877, -2.364970278), (-20.5143392086, -2.1376651712), (-20.2870331705, -1.2284446275), (-21.7645186931, -1.2284446275), align=None)
    extrude(amount=F8_DEPTH)


with BuildPart() as f8c:
    # F7 (on offset) → F8, piece 3 (new body)
    with BuildSketch(Plane.XY.offset(21)):
        with BuildLine():
            Line((-18.6958964914, -7.1383831091), (-18.6958964914, -4.2970655486))
            Line((-18.6958964914, -4.2970655486), (-20.8552982658, -4.2970655486))
            Line((-20.8552982658, -4.2970655486), (-20.8552982658, -7.1383831091))
            ThreePointArc((-20.8552982658, -7.1383831091), (-19.7755973786, -9.0647520211), (-18.6958964914, -7.1383831091))
        make_face()
    extrude(amount=F8_DEPTH)


with BuildPart() as f8d:
    # F7 (on offset) → F8, piece 4 (new body)
    with BuildSketch(Plane.XY.offset(21)):
        with BuildLine():
            Line((-20.9689494222, 4.2268852703), (-18.4685904533, 4.2268852703))
            Line((-18.4685904533, 4.2268852703), (-18.4685904533, 7.4091586284))
            ThreePointArc((-18.4685904533, 7.4091586284), (-19.7187699378, 8.6593381129), (-20.9689494222, 7.4091586284))
            Line((-20.9689494222, 7.4091586284), (-20.9689494222, 4.2268852703))
        make_face()
    extrude(amount=F8_DEPTH)


with BuildPart() as f10:
    # F9 (on offset) → F10 (new body)
    with BuildSketch(Plane.XY.offset(21)):
        with Locations((-19.4186167791, 0.2163989702)):
            Rectangle(F9_W, F9_H)
    extrude(amount=F10_DEPTH)


with BuildPart() as f13:
    # F12 (on offset) → F13 (new body)
    with BuildSketch(Plane.XZ.offset(40)):
        with Locations((-72.8026961442, -14.5231969655)):
            Circle(F12_R)
    extrude(amount=F13_DEPTH)


with BuildPart() as f13b:
    # F12 (on offset) → F13, piece 2 (new body)
    with BuildSketch(Plane.XZ.offset(40)):
        with Locations((-2.735605929, -14.5231969655)):
            Circle(F12_R)
    extrude(amount=F13_DEPTH)


with BuildPart() as f13c:
    # F12 (on offset) → F13, piece 3 (new body)
    with BuildSketch(Plane.XZ.offset(40)):
        with Locations((58.2187140826, -14.5231969655)):
            Circle(F12_R)
    extrude(amount=F13_DEPTH)


with BuildPart() as f20:
    # F19 (on offset) → F20 (new body)
    with BuildSketch(Plane.XZ.offset(-40)):
        with Locations((-72.8781877551, -14.3427830189)):
            Circle(F19_R)
    extrude(amount=-F20_DEPTH)


with BuildPart() as f20b:
    # F19 (on offset) → F20, piece 2 (new body)
    with BuildSketch(Plane.XZ.offset(-40)):
        with Locations((-2.81109754, -14.3427830189)):
            Circle(F19_R)
    extrude(amount=-F20_DEPTH)


with BuildPart() as f20c:
    # F19 (on offset) → F20, piece 3 (new body)
    with BuildSketch(Plane.XZ.offset(-40)):
        with Locations((58.1432224717, -14.3427830189)):
            Circle(F19_R)
    extrude(amount=-F20_DEPTH)


with BuildPart() as f33:
    # F32 (on offset) → F33 (new body)
    with BuildSketch(Plane.YZ.offset(-58)):
        with Locations((0, 25.5681835115)):
            Circle(F32_R)
    extrude(amount=-F33_DEPTH)


with BuildPart() as f35:
    # F34 (on Front) → F35 (revolve)
    with BuildSketch(Plane.XZ):
        Polygon((-58.1059716642, 19.5757467947), (-55.047005415, 20.6966028265), (-55.116587552, 25.1466028265), (-58.1059716642, 25.1466028265), align=None)
    revolve(axis=Axis((-56.6112796081, 0, 25.1466028265), (1, 0, 0)))


with BuildPart() as f37_tool:
    # F36 (on offset) → F37 (new body)
    with BuildSketch(Plane.YZ.offset(-58)):
        with Locations((0, 25.3125000745)):
            Circle(F36_R)
    extrude(amount=-F37_DEPTH)


with BuildPart() as f33_1:
    add(f33.part)

    # F37: cut by f37_tool
    add(f37_tool.part, mode=Mode.SUBTRACT)


with BuildPart() as f35_1:
    add(f35.part)

    # F37: cut by f37_tool
    add(f37_tool.part, mode=Mode.SUBTRACT)


solid = Compound([f1.part, f8.part, f8b.part, f8c.part, f8d.part, f10.part, f13.part, f13b.part, f13c.part, f20.part, f20b.part, f20c.part, f33_1.part, f35_1.part])
